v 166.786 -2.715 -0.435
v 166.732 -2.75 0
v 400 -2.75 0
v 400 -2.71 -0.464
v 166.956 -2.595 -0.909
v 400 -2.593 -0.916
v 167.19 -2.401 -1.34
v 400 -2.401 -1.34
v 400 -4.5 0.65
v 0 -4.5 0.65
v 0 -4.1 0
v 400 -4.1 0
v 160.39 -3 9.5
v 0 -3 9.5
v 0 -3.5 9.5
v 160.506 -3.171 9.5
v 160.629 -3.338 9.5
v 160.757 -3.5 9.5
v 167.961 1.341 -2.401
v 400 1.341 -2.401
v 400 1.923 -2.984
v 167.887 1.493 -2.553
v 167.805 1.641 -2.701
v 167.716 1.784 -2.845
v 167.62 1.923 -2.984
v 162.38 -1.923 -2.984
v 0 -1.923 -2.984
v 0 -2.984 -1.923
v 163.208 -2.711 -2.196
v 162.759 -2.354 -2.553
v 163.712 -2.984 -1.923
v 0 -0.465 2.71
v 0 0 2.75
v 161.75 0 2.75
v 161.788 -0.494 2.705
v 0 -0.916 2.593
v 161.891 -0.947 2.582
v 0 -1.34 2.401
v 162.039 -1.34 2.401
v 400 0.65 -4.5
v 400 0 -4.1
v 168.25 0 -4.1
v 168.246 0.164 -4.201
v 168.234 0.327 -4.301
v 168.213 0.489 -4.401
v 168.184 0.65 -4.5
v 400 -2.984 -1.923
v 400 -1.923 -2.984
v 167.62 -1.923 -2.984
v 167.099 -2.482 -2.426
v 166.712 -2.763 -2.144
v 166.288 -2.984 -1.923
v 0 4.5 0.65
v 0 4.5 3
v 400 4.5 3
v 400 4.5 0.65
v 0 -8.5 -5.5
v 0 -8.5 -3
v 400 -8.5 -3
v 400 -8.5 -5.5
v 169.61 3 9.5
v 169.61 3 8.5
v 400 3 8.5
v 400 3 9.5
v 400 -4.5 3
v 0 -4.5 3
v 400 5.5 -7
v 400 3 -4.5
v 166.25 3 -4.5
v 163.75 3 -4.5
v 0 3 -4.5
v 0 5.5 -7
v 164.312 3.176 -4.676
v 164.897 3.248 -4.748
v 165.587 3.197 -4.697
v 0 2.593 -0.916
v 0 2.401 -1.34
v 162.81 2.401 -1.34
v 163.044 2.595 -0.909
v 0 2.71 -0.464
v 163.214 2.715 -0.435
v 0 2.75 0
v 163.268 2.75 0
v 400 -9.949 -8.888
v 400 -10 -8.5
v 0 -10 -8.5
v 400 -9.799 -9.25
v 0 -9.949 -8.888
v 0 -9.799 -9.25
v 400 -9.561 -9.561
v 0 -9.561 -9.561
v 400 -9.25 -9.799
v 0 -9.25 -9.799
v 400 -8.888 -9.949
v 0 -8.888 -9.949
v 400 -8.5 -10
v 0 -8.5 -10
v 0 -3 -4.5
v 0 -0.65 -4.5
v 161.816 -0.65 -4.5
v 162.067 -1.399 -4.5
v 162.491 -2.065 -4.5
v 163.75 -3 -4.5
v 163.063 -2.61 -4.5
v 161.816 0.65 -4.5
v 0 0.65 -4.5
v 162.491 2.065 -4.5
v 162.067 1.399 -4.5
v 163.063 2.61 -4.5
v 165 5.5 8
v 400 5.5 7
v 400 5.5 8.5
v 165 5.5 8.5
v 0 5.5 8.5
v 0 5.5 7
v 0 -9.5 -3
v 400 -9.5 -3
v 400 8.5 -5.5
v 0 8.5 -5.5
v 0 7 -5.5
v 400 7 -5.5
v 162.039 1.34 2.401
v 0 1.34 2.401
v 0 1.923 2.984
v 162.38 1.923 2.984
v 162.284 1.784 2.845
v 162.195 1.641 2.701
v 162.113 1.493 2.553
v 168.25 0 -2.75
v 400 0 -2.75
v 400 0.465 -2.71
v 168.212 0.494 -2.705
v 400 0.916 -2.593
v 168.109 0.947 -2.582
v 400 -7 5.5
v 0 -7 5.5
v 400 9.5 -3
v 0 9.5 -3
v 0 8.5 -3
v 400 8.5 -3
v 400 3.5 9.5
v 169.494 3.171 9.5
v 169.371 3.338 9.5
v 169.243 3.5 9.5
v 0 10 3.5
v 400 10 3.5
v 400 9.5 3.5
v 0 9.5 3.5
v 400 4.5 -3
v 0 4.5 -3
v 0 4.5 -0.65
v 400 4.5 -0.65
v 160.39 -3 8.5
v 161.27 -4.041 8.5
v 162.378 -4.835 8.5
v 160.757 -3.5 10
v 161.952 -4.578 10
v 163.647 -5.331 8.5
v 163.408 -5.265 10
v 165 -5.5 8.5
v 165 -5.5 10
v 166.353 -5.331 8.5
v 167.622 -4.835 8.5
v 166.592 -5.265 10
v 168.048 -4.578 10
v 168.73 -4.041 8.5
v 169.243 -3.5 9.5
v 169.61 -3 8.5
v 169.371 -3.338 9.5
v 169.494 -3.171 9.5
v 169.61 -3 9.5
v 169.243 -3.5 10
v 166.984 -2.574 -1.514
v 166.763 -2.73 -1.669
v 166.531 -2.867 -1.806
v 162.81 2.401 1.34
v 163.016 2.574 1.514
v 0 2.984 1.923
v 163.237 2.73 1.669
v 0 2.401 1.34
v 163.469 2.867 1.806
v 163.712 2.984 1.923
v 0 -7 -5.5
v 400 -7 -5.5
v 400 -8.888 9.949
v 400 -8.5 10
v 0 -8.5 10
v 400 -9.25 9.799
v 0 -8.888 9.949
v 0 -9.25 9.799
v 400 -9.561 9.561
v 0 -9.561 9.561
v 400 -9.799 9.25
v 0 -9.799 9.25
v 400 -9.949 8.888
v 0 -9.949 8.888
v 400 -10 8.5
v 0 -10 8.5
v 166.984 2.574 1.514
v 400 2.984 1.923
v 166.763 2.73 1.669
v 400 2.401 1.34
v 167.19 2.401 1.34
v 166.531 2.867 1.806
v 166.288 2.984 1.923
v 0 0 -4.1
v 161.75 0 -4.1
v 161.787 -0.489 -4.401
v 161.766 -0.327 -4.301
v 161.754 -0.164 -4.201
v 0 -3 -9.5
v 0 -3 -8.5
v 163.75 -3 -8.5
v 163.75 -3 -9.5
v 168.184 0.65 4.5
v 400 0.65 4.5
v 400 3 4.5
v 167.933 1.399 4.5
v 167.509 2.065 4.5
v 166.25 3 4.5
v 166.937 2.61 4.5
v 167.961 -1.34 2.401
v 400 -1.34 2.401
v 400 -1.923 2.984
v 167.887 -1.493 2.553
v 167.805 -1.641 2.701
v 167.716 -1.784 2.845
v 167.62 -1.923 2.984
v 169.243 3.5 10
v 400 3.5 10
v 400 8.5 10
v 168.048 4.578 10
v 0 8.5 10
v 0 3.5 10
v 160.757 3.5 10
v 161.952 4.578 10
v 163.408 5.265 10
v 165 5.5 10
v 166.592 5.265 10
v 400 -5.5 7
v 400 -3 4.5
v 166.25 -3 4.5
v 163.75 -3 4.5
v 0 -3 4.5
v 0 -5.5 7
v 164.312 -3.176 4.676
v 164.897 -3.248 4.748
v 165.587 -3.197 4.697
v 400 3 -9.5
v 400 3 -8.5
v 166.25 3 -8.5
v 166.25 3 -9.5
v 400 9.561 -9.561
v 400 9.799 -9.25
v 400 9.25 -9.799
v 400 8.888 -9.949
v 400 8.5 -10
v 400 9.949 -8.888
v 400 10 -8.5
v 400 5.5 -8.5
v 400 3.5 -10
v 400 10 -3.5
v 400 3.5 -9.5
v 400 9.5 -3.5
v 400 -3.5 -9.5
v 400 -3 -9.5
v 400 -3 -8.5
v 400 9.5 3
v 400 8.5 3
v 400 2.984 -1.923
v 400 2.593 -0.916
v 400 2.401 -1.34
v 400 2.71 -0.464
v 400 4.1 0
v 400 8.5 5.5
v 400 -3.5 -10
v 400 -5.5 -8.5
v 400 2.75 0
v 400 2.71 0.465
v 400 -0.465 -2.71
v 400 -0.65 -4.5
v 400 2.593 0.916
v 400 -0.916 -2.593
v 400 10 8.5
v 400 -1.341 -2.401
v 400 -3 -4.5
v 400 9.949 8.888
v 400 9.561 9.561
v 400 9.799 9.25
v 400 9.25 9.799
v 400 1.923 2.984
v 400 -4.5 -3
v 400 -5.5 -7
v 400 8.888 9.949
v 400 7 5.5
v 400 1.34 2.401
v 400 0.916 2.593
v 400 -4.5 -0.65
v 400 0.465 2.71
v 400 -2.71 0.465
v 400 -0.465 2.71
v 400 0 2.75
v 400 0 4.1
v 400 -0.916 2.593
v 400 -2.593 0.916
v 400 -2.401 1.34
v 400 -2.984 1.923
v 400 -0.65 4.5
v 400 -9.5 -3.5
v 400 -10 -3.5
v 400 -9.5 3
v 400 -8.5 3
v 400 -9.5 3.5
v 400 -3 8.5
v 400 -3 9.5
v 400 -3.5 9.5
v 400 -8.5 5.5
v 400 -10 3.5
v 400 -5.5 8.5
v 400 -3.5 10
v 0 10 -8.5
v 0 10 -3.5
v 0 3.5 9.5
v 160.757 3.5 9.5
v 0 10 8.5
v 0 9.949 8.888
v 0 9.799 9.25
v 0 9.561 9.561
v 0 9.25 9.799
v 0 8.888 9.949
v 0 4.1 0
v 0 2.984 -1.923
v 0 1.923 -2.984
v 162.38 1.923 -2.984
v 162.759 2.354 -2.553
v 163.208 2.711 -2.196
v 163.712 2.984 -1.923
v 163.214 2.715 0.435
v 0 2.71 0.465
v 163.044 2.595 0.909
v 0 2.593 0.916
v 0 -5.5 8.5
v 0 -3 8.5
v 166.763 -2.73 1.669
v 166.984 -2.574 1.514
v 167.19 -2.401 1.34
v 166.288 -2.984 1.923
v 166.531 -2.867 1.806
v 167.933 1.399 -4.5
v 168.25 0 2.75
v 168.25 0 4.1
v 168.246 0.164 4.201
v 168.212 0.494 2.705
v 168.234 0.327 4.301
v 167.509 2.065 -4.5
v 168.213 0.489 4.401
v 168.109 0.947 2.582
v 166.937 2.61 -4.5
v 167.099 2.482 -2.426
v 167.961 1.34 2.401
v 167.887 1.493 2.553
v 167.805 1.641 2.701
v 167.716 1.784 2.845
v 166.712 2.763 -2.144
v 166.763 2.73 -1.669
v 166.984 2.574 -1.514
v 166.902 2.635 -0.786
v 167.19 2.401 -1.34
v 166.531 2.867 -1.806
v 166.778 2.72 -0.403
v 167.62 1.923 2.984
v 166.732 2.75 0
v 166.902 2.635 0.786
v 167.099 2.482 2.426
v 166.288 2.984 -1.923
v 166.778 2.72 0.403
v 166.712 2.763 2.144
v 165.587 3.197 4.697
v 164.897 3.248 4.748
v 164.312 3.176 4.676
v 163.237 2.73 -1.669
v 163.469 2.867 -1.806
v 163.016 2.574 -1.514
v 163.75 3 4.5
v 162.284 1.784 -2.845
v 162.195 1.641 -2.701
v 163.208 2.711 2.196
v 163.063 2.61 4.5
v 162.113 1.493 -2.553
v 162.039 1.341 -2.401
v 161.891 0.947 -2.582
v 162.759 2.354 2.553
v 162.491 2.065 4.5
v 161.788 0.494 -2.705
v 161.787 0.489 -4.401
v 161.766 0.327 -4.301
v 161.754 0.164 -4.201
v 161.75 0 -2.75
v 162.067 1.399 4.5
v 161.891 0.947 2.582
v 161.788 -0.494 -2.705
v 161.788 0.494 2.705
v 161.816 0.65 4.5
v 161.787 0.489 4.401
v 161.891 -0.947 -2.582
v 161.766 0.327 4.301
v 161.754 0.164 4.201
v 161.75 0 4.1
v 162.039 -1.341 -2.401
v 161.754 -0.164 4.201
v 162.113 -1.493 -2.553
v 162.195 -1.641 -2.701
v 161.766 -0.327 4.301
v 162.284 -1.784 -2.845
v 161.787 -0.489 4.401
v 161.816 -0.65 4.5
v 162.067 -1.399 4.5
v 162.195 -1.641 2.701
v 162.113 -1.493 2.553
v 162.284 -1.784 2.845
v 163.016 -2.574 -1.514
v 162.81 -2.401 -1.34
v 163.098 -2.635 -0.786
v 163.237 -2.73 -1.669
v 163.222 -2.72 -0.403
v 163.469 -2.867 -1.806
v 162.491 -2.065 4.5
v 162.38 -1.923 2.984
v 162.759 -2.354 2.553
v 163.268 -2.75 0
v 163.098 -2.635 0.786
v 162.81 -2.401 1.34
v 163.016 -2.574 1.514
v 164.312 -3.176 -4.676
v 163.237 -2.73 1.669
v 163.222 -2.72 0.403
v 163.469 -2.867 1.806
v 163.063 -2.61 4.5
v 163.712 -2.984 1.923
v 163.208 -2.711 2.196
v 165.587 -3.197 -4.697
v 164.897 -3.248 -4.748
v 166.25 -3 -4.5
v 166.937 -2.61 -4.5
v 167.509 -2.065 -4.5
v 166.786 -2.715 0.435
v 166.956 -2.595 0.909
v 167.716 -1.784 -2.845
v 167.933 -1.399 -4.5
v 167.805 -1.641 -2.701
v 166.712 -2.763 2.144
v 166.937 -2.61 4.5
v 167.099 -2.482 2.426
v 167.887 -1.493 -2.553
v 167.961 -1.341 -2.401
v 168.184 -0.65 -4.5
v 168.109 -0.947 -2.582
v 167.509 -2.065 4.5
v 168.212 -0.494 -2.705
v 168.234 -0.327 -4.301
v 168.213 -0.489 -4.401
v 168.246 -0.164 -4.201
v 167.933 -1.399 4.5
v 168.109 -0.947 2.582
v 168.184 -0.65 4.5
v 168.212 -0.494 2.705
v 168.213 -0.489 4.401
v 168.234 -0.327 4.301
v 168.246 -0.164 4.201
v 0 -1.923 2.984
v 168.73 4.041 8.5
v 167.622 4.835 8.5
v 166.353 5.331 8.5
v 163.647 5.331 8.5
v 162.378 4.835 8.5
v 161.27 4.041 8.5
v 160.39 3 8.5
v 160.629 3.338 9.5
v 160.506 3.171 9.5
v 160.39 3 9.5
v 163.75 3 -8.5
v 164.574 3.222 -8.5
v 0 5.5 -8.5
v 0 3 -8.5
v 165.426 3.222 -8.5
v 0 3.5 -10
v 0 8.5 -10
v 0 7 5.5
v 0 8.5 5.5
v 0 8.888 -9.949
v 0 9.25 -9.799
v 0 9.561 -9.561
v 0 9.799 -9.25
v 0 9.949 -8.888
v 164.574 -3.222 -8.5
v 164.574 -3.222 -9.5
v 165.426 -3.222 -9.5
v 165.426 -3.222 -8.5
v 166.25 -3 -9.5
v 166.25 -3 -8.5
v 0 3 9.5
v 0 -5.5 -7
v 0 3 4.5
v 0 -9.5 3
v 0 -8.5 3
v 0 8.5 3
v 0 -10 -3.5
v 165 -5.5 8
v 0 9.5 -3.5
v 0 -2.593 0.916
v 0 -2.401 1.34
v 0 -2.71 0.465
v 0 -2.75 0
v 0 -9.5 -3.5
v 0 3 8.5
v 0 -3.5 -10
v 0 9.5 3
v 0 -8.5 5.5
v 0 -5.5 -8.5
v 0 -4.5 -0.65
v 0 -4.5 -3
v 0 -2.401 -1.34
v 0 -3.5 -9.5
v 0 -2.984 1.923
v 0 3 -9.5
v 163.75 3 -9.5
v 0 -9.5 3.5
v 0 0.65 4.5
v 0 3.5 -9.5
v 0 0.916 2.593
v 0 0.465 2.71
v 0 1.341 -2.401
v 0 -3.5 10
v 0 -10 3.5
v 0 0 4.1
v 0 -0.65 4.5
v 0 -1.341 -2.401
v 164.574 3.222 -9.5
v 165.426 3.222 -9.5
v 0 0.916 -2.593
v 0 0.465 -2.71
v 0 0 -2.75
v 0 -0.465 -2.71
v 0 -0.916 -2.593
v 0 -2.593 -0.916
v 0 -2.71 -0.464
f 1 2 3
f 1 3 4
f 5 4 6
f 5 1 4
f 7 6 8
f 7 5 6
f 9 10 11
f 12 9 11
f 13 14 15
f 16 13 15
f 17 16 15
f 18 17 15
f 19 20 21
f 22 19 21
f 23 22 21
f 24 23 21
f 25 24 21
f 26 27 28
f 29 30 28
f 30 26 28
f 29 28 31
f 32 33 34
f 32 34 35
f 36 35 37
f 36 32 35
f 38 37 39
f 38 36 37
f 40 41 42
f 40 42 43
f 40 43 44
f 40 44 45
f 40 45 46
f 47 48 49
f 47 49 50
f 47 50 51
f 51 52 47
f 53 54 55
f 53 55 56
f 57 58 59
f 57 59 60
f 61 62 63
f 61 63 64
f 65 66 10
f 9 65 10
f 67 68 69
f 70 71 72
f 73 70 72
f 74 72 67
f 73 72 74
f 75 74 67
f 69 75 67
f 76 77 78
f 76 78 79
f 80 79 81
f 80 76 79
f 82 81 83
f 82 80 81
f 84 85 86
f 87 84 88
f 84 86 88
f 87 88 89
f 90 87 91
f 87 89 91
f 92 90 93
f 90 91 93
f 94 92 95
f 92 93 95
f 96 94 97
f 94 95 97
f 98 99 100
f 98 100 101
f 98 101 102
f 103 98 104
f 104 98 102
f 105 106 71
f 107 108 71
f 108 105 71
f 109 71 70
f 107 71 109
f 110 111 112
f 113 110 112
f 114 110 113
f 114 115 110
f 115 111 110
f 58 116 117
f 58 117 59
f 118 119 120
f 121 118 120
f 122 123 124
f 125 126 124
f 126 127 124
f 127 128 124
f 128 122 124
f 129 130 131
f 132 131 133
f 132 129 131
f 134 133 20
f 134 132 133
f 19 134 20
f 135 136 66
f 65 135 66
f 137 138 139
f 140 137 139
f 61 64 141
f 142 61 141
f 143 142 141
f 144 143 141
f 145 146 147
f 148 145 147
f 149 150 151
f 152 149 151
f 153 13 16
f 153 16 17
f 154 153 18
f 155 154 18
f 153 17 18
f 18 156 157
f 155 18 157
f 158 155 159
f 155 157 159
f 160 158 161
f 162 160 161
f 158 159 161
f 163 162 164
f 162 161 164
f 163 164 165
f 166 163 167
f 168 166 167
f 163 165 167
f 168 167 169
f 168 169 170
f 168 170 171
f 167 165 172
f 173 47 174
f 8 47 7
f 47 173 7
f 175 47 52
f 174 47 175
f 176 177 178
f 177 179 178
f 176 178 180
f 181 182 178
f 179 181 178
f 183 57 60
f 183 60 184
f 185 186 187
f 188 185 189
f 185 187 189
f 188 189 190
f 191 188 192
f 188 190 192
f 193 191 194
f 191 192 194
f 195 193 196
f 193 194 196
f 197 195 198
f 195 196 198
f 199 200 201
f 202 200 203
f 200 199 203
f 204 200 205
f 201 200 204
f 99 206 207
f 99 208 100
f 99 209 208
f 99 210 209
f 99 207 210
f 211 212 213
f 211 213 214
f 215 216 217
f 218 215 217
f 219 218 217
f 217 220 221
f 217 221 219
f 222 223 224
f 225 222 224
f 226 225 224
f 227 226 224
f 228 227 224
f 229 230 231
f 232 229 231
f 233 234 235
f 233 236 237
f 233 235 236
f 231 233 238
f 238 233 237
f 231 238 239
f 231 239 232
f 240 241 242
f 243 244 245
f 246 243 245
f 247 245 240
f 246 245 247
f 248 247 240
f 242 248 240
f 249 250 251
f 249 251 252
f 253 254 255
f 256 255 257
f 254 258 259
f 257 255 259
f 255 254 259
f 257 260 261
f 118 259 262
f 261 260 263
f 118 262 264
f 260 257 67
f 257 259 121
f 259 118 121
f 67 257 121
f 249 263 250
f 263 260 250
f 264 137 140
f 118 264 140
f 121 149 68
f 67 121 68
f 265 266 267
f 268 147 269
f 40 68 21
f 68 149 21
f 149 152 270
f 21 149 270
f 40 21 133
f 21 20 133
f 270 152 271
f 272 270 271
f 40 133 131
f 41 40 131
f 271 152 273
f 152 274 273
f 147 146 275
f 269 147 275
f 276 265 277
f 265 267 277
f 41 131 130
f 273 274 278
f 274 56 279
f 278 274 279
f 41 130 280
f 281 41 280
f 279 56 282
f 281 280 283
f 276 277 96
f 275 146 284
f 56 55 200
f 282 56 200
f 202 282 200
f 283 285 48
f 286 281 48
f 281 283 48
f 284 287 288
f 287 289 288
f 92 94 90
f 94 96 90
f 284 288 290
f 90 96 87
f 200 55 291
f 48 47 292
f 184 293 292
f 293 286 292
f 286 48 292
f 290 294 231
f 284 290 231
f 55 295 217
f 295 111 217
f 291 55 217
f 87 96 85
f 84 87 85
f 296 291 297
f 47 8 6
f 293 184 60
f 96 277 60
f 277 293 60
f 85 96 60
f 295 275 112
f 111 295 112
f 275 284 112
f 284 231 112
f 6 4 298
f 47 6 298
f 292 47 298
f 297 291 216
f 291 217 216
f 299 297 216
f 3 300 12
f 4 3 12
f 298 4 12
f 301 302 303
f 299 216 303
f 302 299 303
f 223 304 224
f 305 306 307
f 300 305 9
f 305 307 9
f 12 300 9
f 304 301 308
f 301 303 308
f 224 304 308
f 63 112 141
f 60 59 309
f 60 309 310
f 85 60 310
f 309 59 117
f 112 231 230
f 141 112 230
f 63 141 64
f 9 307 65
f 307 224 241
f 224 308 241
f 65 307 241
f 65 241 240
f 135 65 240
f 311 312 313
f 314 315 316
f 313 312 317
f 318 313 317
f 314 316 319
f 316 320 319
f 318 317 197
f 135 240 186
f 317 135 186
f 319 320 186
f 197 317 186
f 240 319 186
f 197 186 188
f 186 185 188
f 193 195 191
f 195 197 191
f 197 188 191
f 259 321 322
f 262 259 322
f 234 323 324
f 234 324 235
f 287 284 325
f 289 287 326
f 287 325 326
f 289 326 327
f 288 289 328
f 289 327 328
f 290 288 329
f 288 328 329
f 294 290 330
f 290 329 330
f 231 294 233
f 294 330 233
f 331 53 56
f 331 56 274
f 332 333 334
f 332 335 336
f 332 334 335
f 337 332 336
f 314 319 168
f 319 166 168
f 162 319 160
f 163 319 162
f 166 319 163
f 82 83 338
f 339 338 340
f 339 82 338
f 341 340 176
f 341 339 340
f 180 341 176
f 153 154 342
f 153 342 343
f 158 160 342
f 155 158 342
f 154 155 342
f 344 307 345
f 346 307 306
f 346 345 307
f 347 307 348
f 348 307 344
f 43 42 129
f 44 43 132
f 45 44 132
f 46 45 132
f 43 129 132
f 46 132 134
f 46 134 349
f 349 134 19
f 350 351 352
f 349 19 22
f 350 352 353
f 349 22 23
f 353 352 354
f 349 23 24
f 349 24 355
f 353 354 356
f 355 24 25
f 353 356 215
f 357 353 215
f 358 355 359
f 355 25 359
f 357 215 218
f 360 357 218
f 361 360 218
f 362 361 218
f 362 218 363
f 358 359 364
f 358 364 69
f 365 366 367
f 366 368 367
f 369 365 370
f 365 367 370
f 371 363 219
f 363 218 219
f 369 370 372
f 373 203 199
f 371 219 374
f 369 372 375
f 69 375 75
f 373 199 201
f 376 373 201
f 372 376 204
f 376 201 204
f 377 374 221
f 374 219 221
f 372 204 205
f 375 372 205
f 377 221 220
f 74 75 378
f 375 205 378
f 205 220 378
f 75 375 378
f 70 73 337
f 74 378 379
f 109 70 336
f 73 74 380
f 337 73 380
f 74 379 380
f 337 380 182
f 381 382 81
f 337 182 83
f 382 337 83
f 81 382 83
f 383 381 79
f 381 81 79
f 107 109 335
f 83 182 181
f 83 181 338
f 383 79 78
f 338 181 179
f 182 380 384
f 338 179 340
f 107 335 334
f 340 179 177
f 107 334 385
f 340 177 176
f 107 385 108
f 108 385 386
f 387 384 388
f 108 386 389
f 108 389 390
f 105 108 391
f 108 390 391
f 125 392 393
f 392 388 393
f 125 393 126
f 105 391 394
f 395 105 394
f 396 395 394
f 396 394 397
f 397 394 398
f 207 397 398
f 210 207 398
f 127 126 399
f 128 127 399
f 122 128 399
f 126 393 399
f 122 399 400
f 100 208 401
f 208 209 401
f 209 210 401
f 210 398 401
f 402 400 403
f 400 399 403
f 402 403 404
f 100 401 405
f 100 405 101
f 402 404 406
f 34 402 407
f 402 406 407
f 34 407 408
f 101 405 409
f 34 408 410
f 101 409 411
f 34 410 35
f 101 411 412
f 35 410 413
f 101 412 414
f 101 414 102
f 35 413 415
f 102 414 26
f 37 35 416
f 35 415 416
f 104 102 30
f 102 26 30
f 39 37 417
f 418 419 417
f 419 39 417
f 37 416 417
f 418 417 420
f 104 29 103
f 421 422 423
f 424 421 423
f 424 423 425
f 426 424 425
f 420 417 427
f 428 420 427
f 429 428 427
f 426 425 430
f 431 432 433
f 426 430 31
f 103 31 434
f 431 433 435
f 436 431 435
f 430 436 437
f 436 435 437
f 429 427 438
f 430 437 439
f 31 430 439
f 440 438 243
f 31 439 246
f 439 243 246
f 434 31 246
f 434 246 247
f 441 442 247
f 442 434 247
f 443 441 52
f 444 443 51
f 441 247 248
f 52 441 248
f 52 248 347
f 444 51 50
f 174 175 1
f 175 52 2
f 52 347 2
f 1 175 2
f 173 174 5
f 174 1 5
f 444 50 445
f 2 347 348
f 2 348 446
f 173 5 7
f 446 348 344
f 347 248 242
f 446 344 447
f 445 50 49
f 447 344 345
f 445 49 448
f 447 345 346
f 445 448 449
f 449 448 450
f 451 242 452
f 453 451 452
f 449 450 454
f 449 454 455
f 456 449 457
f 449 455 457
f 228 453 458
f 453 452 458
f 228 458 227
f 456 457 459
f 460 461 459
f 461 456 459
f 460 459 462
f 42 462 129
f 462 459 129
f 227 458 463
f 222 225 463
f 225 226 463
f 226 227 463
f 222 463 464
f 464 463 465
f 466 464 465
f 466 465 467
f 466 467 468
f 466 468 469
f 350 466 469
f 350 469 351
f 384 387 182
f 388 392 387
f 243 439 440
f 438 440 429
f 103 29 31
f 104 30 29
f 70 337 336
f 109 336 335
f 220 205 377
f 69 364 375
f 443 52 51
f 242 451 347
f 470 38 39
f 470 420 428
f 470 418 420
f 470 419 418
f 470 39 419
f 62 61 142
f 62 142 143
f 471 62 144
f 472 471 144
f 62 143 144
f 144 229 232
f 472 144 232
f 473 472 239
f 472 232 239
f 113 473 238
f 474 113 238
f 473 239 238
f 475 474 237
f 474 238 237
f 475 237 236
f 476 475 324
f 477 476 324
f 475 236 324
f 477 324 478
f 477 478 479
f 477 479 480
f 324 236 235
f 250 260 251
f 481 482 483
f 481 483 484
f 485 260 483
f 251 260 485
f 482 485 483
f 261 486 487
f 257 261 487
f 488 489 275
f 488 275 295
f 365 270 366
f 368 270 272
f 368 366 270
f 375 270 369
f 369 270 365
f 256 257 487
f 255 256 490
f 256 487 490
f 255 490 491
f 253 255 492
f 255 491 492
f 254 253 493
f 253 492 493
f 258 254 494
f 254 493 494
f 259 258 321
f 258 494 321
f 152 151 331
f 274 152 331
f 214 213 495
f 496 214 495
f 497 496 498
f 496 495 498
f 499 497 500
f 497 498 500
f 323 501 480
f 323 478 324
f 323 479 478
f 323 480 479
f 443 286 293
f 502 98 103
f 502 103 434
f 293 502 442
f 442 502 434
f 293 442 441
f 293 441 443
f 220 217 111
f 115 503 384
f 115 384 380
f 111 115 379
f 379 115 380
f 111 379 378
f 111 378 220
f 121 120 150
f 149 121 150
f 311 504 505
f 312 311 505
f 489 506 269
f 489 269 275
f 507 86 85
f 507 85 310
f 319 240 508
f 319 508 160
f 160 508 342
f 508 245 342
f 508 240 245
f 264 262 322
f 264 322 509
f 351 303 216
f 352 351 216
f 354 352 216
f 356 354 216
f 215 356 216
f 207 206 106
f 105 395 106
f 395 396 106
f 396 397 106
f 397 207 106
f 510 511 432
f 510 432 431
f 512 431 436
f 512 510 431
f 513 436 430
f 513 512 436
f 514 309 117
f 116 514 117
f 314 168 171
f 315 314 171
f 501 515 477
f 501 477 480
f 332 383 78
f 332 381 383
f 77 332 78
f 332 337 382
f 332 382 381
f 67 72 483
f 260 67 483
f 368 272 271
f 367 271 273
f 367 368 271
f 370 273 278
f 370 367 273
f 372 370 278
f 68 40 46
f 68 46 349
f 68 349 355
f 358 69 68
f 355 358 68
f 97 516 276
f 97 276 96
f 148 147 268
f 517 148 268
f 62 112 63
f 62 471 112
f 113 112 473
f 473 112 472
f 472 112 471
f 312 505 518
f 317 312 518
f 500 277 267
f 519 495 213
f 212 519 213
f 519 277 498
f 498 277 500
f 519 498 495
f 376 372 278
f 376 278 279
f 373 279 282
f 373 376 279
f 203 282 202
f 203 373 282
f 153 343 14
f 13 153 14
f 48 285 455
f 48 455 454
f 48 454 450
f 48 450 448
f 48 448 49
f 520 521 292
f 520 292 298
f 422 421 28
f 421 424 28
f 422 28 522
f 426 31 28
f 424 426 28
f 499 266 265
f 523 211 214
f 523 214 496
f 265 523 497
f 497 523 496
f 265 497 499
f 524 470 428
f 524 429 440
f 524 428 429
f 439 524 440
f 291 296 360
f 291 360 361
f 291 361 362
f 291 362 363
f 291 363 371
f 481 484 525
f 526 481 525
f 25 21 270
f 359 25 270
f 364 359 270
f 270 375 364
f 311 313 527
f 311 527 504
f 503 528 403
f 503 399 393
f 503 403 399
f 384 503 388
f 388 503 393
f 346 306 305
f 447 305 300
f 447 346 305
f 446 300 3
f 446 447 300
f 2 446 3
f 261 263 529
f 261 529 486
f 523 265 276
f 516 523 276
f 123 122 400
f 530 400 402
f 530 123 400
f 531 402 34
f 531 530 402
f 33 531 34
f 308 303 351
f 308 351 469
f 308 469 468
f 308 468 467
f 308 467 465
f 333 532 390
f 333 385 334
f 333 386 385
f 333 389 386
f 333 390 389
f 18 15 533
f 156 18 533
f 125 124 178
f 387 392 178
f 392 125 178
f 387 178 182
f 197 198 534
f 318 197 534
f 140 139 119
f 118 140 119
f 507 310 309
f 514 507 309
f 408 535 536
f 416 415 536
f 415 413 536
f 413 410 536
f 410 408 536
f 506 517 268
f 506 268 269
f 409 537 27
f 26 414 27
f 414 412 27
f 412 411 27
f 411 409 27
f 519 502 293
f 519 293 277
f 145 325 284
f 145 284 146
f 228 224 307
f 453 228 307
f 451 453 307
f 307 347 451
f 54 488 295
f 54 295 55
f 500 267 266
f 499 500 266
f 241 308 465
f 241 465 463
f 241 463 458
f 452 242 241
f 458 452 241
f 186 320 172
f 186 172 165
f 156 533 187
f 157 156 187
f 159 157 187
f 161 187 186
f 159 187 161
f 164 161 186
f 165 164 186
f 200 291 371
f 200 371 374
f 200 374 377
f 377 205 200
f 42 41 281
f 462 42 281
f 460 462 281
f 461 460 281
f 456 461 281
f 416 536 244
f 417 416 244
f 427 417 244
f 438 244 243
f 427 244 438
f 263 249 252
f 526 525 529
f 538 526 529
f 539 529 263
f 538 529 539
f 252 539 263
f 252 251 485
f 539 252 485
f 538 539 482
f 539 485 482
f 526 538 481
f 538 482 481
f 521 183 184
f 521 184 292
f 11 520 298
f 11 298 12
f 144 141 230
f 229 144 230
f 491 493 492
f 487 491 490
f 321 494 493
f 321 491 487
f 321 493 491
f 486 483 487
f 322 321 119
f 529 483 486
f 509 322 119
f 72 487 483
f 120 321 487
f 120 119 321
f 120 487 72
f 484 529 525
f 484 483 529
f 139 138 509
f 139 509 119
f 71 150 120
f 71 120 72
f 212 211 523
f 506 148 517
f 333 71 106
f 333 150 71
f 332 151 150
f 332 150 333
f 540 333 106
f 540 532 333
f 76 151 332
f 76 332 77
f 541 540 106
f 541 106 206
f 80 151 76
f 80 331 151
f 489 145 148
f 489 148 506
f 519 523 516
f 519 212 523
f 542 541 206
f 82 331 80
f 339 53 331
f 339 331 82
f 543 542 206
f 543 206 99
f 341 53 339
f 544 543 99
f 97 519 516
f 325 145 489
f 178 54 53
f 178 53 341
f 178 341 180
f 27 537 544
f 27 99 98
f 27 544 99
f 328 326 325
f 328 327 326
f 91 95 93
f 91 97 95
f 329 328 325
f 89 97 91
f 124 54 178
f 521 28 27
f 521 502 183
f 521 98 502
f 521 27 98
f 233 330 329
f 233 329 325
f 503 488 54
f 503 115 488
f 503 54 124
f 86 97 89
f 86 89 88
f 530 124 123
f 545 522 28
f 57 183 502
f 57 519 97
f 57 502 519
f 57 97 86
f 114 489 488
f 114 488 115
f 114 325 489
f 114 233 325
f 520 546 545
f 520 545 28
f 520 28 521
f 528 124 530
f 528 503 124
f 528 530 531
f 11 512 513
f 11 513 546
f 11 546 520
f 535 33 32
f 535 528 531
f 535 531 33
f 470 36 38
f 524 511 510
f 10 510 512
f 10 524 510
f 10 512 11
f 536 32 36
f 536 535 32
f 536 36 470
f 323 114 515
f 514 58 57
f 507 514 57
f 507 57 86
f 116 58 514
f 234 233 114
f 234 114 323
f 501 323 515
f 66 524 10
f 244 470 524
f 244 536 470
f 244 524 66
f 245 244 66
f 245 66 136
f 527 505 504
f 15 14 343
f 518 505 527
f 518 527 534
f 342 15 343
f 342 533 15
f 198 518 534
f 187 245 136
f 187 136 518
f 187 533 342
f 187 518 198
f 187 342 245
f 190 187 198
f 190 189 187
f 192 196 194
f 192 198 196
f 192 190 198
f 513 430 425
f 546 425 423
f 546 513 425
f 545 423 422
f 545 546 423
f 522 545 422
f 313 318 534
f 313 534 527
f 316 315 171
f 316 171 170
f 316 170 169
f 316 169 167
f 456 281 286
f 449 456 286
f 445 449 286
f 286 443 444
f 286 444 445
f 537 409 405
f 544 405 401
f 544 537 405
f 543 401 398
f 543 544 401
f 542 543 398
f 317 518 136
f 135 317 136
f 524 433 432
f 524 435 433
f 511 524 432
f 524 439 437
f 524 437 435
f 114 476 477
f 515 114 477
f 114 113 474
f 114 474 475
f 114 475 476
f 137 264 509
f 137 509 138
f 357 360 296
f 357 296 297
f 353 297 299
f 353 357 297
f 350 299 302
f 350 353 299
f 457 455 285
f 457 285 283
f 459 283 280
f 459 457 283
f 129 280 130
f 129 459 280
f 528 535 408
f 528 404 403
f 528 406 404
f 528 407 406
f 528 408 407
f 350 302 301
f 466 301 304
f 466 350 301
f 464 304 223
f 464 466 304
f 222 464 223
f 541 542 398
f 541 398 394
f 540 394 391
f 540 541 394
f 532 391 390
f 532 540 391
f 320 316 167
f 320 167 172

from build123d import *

# Parameters (mm, degrees)
PAD_DEPTH       = 400
SKETCH001_R     = 3.25
POCKET_DEPTH    = 21
SKETCH002_R     = 5.5
POCKET001_DEPTH = 2


with BuildPart() as part:
    # Sketch → Pad (new body)
    with BuildSketch(Plane.YZ):
        with BuildLine():
            Line((0, 4.1), (0.65, 4.5))
            Line((0.65, 4.5), (3, 4.5))
            Line((3, 4.5), (5.5, 7))
            Line((5.5, 7), (5.5, 8.5))
            Line((5.5, 8.5), (3, 8.5))
            Line((3, 8.5), (3, 9.5))
            Line((3, 9.5), (3.5, 9.5))
            Line((3.5, 9.5), (3.5, 10))
            Line((3.5, 10), (8.5, 10))
            ThreePointArc((10, 8.5), (9.56066, 9.56066), (8.5, 10))
            Line((10, 8.5), (10, 3.5))
            Line((10, 3.5), (9.5, 3.5))
            Line((9.5, 3.5), (9.5, 3))
            Line((9.5, 3), (8.5, 3))
            Line((8.5, 3), (8.5, 5.5))
            Line((8.5, 5.5), (7, 5.5))
            Line((7, 5.5), (4.5, 3))
            Line((4.5, 3), (4.5, 0.65))
            Line((4.5, 0.65), (4.1, 0))
            Line((4.5, -0.65), (4.1, 0))
            Line((4.5, -3), (4.5, -0.65))
            Line((7, -5.5), (4.5, -3))
            Line((8.5, -5.5), (7, -5.5))
            Line((8.5, -3), (8.5, -5.5))
            Line((9.5, -3), (8.5, -3))
            Line((9.5, -3.5), (9.5, -3))
            Line((10, -3.5), (9.5, -3.5))
            Line((10, -8.5), (10, -3.5))
            ThreePointArc((8.5, -10), (9.56066, -9.56066), (10, -8.5))
            Line((3.5, -10), (8.5, -10))
            Line((3.5, -9.5), (3.5, -10))
            Line((3, -9.5), (3.5, -9.5))
            Line((3, -8.5), (3, -9.5))
            Line((5.5, -8.5), (3, -8.5))
            Line((5.5, -7), (5.5, -8.5))
            Line((3, -4.5), (5.5, -7))
            Line((0.65, -4.5), (3, -4.5))
            Line((0, -4.1), (0.65, -4.5))
            Line((0, -4.1), (-0.65, -4.5))
            Line((-0.65, -4.5), (-3, -4.5))
            Line((-3, -4.5), (-5.5, -7))
            Line((-5.5, -7), (-5.5, -8.5))
            Line((-5.5, -8.5), (-3, -8.5))
            Line((-3, -8.5), (-3, -9.5))
            Line((-3, -9.5), (-3.5, -9.5))
            Line((-3.5, -9.5), (-3.5, -10))
            Line((-3.5, -10), (-8.5, -10))
            ThreePointArc((-10, -8.5), (-9.56066, -9.56066), (-8.5, -10))
            Line((-10, -8.5), (-10, -3.5))
            Line((-10, -3.5), (-9.5, -3.5))
            Line((-9.5, -3.5), (-9.5, -3))
            Line((-9.5, -3), (-8.5, -3))
            Line((-8.5, -3), (-8.5, -5.5))
            Line((-8.5, -5.5), (-7, -5.5))
            Line((-7, -5.5), (-4.5, -3))
            Line((-4.5, -3), (-4.5, -0.65))
            Line((-4.5, -0.65), (-4.1, 0))
            Line((-4.5, 0.65), (-4.1, 0))
            Line((-4.5, 3), (-4.5, 0.65))
            Line((-7, 5.5), (-4.5, 3))
            Line((-8.5, 5.5), (-7, 5.5))
            Line((-8.5, 3), (-8.5, 5.5))
            Line((-9.5, 3), (-8.5, 3))
            Line((-9.5, 3.5), (-9.5, 3))
            Line((-10, 3.5), (-9.5, 3.5))
            Line((-10, 8.5), (-10, 3.5))
            ThreePointArc((-8.5, 10), (-9.56066, 9.56066), (-10, 8.5))
            Line((-3.5, 10), (-8.5, 10))
            Line((-3.5, 9.5), (-3.5, 10))
            Line((-3, 9.5), (-3.5, 9.5))
            Line((-3, 8.5), (-3, 9.5))
            Line((-5.5, 8.5), (-3, 8.5))
            Line((-5.5, 7), (-5.5, 8.5))
            Line((-3, 4.5), (-5.5, 7))
            Line((-0.65, 4.5), (-3, 4.5))
            Line((0, 4.1), (-0.65, 4.5))
        make_face()
        with BuildLine():
            Line((1.340499, 2.401159), (1.923239, 2.983899))
            Line((1.923239, 2.983899), (2.983899, 1.923239))
            Line((2.983899, 1.923239), (2.401159, 1.340499))
            ThreePointArc((2.75, 0), (2.661361, 0.692573), (2.401159, 1.340499))
            ThreePointArc((2.401164, -1.34049), (2.661362, -0.692568), (2.75, 0))
            Line((2.983904, -1.92323), (2.401164, -1.34049))
            Line((1.923247, -2.983894), (2.983904, -1.92323))
            Line((1.340507, -2.401154), (1.923247, -2.983894))
            ThreePointArc((0, -2.75), (0.692577, -2.66136), (1.340507, -2.401154))
            ThreePointArc((-1.340507, -2.401154), (-0.692577, -2.66136), (0, -2.75))
            Line((-1.340507, -2.401154), (-1.923247, -2.983894))
            Line((-1.923247, -2.983894), (-2.983904, -1.92323))
            Line((-2.983904, -1.92323), (-2.401164, -1.34049))
            ThreePointArc((-2.75, 0), (-2.661362, -0.692568), (-2.401164, -1.34049))
            ThreePointArc((-2.401159, 1.340499), (-2.661361, 0.692572), (-2.75, 0))
            Line((-2.983899, 1.923239), (-2.401159, 1.340499))
            Line((-1.923239, 2.983899), (-2.983899, 1.923239))
            Line((-1.340499, 2.401159), (-1.923239, 2.983899))
            ThreePointArc((0, 2.75), (-0.692573, 2.661361), (-1.340499, 2.401159))
            ThreePointArc((1.340499, 2.401159), (0.692573, 2.661361), (0, 2.75))
        make_face(mode=Mode.SUBTRACT)
    extrude(amount=PAD_DEPTH)

    # Sketch001 → Pocket (cut)
    with BuildSketch(Plane.XY.offset(10)):
        with Locations((165, 0)):
            Circle(SKETCH001_R)
    extrude(amount=-POCKET_DEPTH, mode=Mode.SUBTRACT)

    # Sketch002 → Pocket001 (cut)
    with BuildSketch(Plane.XY.offset(10)):
        with Locations((165, 0)):
            Circle(SKETCH002_R)
    extrude(amount=-POCKET001_DEPTH, mode=Mode.SUBTRACT)


solid = part.part
